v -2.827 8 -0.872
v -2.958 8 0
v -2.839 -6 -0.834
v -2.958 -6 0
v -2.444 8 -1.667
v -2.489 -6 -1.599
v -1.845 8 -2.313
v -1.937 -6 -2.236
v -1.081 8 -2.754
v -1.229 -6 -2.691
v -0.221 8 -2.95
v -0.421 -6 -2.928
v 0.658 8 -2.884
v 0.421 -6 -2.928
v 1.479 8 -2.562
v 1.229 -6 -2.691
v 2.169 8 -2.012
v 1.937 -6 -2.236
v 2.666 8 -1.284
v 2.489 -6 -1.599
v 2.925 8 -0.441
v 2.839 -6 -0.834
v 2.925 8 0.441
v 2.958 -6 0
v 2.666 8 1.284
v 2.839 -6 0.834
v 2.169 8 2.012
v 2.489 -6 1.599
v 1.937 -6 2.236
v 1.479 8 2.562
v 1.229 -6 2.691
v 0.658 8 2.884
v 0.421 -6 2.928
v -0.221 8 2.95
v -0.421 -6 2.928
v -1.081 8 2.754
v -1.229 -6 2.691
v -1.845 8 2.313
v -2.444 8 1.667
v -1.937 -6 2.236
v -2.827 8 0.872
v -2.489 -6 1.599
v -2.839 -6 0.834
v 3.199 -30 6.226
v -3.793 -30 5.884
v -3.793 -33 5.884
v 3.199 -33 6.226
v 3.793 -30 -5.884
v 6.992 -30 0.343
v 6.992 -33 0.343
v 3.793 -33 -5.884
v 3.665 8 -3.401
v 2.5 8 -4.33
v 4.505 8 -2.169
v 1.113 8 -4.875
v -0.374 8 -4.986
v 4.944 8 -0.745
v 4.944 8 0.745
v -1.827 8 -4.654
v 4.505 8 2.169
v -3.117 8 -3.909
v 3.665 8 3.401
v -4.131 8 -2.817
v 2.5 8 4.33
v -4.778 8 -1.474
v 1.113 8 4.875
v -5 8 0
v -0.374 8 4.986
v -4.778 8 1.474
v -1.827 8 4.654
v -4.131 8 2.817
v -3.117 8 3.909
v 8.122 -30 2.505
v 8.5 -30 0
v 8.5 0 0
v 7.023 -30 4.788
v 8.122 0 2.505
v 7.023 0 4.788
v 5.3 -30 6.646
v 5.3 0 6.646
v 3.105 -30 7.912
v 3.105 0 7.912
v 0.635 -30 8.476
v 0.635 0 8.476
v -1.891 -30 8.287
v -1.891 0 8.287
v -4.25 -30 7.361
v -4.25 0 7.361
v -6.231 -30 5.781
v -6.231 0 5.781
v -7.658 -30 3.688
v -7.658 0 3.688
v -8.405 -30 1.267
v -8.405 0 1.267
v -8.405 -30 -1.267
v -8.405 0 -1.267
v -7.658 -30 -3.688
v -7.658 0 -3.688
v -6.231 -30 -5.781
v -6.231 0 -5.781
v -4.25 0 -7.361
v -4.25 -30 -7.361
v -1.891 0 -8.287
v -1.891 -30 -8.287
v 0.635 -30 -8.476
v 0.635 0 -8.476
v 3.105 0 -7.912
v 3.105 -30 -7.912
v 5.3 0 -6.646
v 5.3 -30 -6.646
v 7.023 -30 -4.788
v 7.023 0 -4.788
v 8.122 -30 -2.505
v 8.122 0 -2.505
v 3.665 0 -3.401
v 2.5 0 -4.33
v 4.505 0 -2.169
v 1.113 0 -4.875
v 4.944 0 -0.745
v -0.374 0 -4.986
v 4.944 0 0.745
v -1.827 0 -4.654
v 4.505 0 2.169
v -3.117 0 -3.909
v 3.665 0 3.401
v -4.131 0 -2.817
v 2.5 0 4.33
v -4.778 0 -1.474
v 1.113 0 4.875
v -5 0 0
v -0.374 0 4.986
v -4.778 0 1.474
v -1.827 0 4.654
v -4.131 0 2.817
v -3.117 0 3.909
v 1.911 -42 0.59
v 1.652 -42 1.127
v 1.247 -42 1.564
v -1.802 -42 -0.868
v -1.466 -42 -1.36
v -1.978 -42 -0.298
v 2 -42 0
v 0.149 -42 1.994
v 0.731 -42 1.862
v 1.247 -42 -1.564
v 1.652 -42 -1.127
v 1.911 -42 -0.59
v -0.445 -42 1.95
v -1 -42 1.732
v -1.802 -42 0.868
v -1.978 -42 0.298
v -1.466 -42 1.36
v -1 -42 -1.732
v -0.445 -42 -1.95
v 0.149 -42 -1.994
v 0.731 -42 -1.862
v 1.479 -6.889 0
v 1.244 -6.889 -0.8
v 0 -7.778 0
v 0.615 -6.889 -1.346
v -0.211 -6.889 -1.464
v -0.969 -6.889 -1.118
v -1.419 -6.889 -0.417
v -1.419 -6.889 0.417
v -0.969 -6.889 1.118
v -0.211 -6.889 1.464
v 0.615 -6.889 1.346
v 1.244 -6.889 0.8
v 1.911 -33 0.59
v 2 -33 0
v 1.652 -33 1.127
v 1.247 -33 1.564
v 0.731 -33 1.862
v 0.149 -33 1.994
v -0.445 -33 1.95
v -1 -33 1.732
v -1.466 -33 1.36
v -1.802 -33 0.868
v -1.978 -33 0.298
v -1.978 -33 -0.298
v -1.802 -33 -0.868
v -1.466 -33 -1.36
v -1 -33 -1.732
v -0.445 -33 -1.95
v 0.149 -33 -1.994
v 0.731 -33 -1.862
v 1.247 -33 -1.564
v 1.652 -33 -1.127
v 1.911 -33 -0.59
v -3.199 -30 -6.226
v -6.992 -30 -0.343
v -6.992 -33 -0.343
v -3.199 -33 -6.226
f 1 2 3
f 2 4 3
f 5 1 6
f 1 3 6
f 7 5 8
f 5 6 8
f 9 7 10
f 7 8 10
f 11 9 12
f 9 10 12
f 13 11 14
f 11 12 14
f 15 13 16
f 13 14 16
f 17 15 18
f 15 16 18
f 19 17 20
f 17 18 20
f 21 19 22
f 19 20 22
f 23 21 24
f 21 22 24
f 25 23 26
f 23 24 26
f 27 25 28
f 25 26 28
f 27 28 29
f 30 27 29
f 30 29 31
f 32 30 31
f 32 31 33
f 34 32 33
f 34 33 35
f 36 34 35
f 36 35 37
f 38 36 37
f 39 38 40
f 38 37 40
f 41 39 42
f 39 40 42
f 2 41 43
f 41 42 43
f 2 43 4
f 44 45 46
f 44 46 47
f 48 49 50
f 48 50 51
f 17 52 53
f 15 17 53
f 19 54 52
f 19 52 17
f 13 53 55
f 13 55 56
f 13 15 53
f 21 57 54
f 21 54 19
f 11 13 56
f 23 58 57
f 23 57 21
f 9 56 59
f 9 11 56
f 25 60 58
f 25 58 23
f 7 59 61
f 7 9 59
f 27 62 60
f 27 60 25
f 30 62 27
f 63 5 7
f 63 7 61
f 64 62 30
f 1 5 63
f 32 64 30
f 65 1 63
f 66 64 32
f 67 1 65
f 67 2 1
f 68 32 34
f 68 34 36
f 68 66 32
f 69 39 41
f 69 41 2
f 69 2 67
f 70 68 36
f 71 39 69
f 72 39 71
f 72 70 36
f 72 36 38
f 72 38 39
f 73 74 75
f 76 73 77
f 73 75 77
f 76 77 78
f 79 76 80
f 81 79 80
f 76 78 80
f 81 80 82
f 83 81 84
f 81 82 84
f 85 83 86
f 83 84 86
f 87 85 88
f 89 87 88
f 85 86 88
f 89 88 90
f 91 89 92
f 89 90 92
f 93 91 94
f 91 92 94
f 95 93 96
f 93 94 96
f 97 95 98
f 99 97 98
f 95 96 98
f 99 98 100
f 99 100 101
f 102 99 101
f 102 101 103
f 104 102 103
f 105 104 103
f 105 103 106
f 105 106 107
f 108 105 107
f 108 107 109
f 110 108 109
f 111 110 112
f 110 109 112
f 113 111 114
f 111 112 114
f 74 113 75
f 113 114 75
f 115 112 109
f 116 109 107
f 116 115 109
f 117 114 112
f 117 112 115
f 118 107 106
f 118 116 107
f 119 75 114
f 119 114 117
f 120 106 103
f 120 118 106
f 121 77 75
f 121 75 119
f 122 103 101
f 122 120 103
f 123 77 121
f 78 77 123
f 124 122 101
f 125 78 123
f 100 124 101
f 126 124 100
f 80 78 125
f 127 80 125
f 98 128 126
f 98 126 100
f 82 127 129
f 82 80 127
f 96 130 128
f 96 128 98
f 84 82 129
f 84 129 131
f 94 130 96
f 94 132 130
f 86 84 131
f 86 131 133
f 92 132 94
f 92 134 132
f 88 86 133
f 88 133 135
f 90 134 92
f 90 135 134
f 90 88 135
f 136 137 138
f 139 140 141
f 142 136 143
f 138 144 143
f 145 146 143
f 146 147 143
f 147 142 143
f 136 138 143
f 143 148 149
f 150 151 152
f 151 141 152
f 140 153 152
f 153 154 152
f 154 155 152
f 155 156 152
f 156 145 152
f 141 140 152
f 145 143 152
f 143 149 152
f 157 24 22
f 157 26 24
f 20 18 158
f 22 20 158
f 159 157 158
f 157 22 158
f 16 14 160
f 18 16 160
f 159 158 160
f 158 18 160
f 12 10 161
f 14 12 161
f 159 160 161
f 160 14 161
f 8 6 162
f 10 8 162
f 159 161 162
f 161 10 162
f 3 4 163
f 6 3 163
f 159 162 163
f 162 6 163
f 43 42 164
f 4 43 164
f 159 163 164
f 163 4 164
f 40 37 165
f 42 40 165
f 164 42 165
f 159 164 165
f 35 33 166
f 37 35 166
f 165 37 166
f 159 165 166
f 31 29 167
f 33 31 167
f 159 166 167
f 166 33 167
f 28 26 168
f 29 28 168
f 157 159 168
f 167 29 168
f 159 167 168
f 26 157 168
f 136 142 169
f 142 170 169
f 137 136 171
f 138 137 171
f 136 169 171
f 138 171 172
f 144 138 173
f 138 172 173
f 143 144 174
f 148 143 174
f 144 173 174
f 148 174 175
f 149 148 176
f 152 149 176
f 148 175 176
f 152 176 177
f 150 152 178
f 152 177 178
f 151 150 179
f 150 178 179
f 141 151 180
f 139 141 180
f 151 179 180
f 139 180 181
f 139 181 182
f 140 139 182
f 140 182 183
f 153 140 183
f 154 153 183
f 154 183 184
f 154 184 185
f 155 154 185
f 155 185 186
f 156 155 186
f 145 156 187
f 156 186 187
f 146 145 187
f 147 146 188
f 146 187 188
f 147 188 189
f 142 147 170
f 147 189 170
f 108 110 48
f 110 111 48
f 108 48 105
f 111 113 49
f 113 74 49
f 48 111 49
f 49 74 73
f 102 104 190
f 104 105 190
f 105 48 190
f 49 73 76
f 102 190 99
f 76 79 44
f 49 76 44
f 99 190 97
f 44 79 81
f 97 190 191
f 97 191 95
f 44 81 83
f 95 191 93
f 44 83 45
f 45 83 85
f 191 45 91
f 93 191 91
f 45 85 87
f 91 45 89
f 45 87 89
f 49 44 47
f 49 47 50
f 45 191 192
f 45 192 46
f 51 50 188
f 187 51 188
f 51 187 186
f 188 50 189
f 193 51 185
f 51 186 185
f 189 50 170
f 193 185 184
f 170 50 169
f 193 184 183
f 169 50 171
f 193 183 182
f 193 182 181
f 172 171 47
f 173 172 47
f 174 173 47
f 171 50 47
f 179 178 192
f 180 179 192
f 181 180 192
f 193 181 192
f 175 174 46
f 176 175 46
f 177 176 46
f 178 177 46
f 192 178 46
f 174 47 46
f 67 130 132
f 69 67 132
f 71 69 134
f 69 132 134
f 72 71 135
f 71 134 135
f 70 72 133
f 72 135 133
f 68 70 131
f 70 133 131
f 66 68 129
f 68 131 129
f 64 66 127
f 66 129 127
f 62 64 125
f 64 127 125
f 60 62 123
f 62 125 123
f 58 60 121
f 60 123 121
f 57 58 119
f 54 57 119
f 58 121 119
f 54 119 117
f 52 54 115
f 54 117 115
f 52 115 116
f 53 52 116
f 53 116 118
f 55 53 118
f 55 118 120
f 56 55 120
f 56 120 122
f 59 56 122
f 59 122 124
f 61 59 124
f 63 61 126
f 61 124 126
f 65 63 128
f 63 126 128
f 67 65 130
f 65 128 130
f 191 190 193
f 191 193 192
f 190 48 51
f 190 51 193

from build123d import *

# Parameters (mm, degrees)
SKETCH1_W           = 8.5
SKETCH1_H           = 30
BOSS_EXTRUDE1_DEPTH = 3
SKETCH3_R           = 5
BOSS_EXTRUDE2_DEPTH = 8
SKETCH4_W           = 2
SKETCH4_H           = 9
HOLE1_D             = 5.917
HOLE1_DEPTH         = 14
HOLE1_TIP           = 1.777646141


with BuildPart() as part:
    # Sketch1 → Revolve1 (revolve)
    with BuildSketch(Plane.XY):
        with Locations((4.25, -15)):
            Rectangle(SKETCH1_W, SKETCH1_H)
    revolve(axis=Axis((0, 0, 0), (0, -1, 0)))

    # Sketch2 → Boss-Extrude1 (add)
    with BuildSketch(Plane.XZ.offset(30)):
        Polygon((-3.79267276, 5.883505191), (3.198928579, 6.226303554), (6.991601339, 0.342798363), (3.79267276, -5.883505191), (-3.198928579, -6.226303554), (-6.991601339, -0.342798363), align=None)
    extrude(amount=BOSS_EXTRUDE1_DEPTH)

    # Sketch3 → Boss-Extrude2 (add)
    with BuildSketch(Plane(origin=(0, 0, 0), x_dir=(-1, 0, 0), z_dir=(0, 1, 0))):
        Circle(SKETCH3_R)
    extrude(amount=BOSS_EXTRUDE2_DEPTH)

    # Sketch4 → Revolve2 (revolve)
    with BuildSketch(Plane.XY):
        with Locations((1, -37.5)):
            Rectangle(SKETCH4_W, SKETCH4_H)
    revolve(axis=Axis((0, -33, 0), (0, -1, 0)))

    # Hole1
    with Locations(Plane(origin=(0, 8, 0), x_dir=(1, 0, 0), z_dir=(0, 1, 0))):
        with Locations((0, 0)):
            Hole(HOLE1_D / 2, depth=HOLE1_DEPTH)
            with Locations((0, 0, -(HOLE1_DEPTH + HOLE1_TIP / 2))):  # 118° drill point
                Cone(0, HOLE1_D / 2, HOLE1_TIP, mode=Mode.SUBTRACT)


solid = part.part
